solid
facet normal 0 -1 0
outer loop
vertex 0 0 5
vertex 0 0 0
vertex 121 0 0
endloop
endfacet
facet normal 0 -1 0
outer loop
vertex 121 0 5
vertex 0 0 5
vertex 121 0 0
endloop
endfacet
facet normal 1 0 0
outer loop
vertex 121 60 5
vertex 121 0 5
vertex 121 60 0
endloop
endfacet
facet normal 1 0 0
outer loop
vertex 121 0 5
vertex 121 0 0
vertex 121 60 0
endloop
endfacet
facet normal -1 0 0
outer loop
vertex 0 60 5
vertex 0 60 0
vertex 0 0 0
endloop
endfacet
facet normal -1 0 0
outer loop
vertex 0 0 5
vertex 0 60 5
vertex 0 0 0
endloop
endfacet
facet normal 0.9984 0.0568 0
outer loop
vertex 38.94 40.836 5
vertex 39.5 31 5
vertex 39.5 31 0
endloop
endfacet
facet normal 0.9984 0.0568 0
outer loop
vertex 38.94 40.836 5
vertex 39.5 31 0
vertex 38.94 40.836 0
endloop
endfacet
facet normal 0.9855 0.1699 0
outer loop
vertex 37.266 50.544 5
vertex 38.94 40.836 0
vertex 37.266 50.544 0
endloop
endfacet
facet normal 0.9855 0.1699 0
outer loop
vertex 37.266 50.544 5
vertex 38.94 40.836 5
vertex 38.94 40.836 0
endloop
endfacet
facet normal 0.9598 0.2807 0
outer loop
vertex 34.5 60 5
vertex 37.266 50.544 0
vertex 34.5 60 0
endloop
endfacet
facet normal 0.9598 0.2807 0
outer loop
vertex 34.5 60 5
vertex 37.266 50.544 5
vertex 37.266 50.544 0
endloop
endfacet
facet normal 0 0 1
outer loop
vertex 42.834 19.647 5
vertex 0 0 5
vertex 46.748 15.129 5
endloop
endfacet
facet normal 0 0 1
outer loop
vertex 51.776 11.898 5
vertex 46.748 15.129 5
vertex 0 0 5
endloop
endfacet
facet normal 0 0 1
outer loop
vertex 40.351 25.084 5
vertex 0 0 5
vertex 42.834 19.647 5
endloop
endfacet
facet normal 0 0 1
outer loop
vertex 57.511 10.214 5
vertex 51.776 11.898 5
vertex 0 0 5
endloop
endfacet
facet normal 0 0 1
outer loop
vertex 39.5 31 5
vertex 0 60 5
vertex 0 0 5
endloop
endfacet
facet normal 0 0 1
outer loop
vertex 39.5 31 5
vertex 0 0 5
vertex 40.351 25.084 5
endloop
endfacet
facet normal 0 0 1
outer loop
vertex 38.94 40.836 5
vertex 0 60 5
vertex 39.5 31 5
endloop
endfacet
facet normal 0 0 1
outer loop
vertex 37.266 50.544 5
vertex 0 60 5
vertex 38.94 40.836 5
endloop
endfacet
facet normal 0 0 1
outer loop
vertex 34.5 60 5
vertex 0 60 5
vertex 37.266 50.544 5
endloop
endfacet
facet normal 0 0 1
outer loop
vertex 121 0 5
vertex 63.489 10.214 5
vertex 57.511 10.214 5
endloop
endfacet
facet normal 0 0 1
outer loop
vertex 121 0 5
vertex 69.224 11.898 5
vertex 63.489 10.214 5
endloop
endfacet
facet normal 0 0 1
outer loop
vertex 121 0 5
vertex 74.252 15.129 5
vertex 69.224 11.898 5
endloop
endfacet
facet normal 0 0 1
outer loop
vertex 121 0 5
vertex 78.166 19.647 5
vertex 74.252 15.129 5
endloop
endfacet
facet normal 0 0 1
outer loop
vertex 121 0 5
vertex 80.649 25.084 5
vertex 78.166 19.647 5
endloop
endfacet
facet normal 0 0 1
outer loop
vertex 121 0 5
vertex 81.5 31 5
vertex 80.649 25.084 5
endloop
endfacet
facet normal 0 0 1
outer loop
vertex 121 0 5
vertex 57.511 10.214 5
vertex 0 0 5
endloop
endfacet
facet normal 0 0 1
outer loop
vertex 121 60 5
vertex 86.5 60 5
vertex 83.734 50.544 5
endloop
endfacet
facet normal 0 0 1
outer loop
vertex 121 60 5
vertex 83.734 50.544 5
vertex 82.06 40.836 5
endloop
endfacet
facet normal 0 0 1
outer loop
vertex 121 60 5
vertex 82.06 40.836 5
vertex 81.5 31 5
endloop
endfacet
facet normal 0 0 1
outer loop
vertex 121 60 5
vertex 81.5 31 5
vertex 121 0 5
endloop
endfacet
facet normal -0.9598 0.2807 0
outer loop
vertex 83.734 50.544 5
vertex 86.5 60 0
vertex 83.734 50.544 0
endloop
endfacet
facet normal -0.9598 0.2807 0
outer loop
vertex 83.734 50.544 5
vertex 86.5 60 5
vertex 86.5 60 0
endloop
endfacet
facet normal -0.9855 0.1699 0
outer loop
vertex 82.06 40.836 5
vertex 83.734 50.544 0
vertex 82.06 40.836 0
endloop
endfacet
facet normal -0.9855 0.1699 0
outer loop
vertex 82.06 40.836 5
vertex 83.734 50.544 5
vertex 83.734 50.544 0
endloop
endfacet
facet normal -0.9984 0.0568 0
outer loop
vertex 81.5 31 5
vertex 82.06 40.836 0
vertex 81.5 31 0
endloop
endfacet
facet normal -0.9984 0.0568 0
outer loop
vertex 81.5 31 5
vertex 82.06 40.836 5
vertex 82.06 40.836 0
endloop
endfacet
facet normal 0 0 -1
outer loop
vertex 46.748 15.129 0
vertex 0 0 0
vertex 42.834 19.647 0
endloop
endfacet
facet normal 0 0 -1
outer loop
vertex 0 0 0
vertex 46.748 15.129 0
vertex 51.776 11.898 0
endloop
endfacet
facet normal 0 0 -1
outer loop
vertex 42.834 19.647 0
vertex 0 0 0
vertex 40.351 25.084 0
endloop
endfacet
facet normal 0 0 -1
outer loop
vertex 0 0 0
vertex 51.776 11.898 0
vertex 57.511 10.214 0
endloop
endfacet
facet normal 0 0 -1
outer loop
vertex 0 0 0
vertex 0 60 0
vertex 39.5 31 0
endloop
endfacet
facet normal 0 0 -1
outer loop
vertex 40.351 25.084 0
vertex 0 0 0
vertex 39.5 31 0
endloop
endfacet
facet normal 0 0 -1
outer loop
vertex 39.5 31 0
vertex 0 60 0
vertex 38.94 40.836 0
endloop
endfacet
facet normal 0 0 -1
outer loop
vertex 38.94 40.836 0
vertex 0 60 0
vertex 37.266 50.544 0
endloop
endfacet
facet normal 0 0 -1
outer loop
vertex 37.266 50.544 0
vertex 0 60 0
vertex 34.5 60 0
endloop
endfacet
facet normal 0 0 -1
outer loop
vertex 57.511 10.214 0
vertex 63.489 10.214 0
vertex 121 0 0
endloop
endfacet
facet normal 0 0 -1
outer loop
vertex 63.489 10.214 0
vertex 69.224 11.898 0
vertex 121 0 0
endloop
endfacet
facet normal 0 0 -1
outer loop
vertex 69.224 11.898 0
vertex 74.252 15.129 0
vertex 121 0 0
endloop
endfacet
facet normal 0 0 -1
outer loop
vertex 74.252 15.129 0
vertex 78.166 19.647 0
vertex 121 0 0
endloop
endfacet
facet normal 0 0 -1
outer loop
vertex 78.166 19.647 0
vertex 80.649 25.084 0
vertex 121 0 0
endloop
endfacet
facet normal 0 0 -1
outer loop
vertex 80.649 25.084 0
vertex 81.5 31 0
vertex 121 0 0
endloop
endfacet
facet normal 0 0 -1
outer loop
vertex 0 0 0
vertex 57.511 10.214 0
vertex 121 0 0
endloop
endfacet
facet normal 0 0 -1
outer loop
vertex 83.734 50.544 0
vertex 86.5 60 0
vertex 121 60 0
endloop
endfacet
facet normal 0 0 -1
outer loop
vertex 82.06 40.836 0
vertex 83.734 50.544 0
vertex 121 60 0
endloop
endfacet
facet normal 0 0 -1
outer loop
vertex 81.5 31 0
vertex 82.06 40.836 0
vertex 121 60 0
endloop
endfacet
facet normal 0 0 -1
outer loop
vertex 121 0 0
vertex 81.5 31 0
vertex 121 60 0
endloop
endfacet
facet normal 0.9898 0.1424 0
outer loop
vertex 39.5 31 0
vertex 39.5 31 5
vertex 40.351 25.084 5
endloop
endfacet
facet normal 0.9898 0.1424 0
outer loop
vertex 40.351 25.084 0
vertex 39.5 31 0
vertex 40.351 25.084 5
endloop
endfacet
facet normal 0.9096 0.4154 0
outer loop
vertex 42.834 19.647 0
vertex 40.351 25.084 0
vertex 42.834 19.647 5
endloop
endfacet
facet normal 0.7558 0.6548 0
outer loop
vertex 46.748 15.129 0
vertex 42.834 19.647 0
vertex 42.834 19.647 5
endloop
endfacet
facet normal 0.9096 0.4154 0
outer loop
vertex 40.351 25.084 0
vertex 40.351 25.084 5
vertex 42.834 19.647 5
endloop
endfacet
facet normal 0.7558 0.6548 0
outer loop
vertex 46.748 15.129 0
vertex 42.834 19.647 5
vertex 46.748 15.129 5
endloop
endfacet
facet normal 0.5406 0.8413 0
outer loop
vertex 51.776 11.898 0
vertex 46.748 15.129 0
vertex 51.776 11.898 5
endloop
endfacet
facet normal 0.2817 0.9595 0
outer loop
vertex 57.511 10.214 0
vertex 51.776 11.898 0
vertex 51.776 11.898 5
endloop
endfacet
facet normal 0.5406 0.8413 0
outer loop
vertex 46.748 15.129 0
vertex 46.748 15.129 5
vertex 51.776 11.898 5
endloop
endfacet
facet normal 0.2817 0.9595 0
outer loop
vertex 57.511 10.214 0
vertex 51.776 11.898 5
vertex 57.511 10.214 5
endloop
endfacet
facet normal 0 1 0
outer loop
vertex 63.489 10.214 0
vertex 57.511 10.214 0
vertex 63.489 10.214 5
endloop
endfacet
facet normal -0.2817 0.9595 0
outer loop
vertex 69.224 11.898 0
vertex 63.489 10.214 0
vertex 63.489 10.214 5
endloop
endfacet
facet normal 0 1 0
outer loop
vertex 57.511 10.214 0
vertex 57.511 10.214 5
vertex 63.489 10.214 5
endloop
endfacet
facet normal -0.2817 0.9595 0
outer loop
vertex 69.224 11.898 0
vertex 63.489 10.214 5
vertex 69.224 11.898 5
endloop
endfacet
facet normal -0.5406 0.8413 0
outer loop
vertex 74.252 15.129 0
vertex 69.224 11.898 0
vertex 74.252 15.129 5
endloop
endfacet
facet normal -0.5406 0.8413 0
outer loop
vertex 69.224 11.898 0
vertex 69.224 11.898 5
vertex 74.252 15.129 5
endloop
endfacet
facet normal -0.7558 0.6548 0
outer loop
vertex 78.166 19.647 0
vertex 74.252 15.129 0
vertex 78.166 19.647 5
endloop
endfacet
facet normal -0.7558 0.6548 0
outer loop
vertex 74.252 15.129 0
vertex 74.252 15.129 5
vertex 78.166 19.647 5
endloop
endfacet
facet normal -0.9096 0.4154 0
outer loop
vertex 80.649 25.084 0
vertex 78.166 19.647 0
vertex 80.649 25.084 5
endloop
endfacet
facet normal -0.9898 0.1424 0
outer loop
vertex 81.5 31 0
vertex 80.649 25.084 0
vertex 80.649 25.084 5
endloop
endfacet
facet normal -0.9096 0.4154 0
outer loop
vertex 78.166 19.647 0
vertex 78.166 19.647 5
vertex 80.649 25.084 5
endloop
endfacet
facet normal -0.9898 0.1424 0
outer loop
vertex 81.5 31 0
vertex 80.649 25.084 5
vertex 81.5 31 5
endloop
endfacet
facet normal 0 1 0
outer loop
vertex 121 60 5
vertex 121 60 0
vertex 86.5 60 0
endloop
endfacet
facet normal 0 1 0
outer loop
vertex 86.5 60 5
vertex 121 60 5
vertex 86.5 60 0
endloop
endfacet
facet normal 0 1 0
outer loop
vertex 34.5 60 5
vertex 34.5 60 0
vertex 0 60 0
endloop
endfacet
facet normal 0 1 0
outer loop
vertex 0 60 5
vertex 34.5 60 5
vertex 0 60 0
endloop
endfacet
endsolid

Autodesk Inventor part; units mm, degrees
ref_plane "YZ Plane" through (0, 0, 0) normal (1, 0, 0) x (0, 1, 0)
ref_plane "XZ Plane" through (0, 0, 0) normal (0, 1, 0) x (-1, 0, 0)
ref_plane "XY Plane" through (0, 0, 0) normal (0, 0, 1) x (1, 0, 0)
sketch "Sketch1" plane through (0, 0, 0) normal (0, 0, 1) x (1, 0, 0)
  line L0 (0, 0) -> (121, 0)
  line L1 (121, 0) -> (121, 60)
  line L2 (121, 60) -> (0, 60)
  line L3 (0, 60) -> (0, 0)
  dimension "d0" = 121
  dimension "d1" = 60
extrude "Extrusion1" add sketch "Sketch1" along normal blind 5
sketch "Sketch2" plane through (0, 0, 5) normal (0, 0, 1) x (1, 0, 0)
  circle A0 centre (60.5, 45.5856) radius 9.2358
  line L0 (121, 60) -> (0, 60) construction
  line L1 (60.5, 60) -> (60.5, 0) construction
  line L2 (0, 0) -> (121, 0) construction
extrude "Extrusion2" cut sketch "Sketch2" against normal blind 5
sketch "Sketch4" plane through (0, 0, 5) normal (0, 0, 1) x (1, 0, 0)
  circle A0 centre (60.5, 31) radius 16 construction
  line L0 (0, 0) -> (121, 0) construction
  line L1 (60.5, 0) -> (60.5, 60) construction
  line L2 (60.5, 60) -> (34.5, 60) construction
  arc A1 (39.5, 31) -> (81.5, 31) centre (60.5, 31) ccw
  line L3 (60.5, 31) -> (81.5, 31) construction
  line L4 (60.5, 31) -> (39.5, 31) construction
  line L5 (60.5, 60) -> (86.5, 60) construction
  line L6 (121, 60) -> (0, 60) construction
  line L7 (34.5, 60) -> (86.5, 60)
  arc A2 (39.5, 31) -> (34.5, 60) centre (-47.1, 31) ccw
  arc A3 (86.5, 60) -> (81.5, 31) centre (168.1, 31) ccw
  dimension "d28" = 26
  dimension "d30" = 21
  dimension "d33" = 32
  dimension "d34" = 180
  dimension "d35" = 90
  dimension "d36" = 26
  dimension "d39" = 0
extrude "Extrusion5" cut sketch "Sketch4" against normal blind 5
equation "\"d0\" = tankw + 2 * slack + 2 * surroundt + 2 * pvct"
equation "\"d1\" = surroundh"
equation "\"d2\" = surroundt"
equation "\"d4\" = surroundt"
equation "\"d30\" = 0.5 * diasurroundhole"
equation "\"d37\" = surroundt"
equation "\"lcsd\" = 19.05"
equation "\"lcwd1\" = 25"
equation "\"lcwd2\" = 34"
equation "\"lch1\" = 39"
equation "\"lcwd3\" = 43"
equation "\"dia1\" = 6"
equation "\"td\" = 18"
equation "\"bhh\" = 6"
equation "\"sw\" = 25"
equation "\"sh\" = 31"
equation "\"spacert\" = 2"
equation "\"pvct\" = 5"
equation "\"tankl\" = 379"
equation "\"dia4\" = 11"
equation "\"dia3\" = 8"
equation "\"play\" = 9"
equation "\"holeh\" = 26"
equation "\"surroundh\" = 60"
equation "\"slack\" = 0.5"
equation "\"surroundt\" = 5"
equation "\"play2\" = 3"
equation "\"diaair\" = 32"
equation "\"diacucl\" = 32"
equation "\"diawater\" = 25"
equation "\"diaph\" = 32"
equation "\"diaoverflow\" = 25"
equation "\"diasurroundhole\" = 42"
equation "\"diagrate\" = 12"
equation "\"gratespacing\" = 12.02082"
equation "\"bottomdist\" = 9.6355"
equation "\"sidedist\" = 13.9375"
equation "\"diahcl\" = 32"
equation "\"bracketwtop\" = 6"
equation "\"bracketwbottom\" = 6"
equation "\"nett\" = 1"
equation "\"nethole\" = 16"
equation "\"nettop\" = 7"
equation "\"netside\" = 3.5"
equation "\"netholespacing\" = 2"
equation "\"diaetape\" = 32"
equation "\"tankw\" = 100"
properties part number "surround_front back" material "PVC-Piping"
